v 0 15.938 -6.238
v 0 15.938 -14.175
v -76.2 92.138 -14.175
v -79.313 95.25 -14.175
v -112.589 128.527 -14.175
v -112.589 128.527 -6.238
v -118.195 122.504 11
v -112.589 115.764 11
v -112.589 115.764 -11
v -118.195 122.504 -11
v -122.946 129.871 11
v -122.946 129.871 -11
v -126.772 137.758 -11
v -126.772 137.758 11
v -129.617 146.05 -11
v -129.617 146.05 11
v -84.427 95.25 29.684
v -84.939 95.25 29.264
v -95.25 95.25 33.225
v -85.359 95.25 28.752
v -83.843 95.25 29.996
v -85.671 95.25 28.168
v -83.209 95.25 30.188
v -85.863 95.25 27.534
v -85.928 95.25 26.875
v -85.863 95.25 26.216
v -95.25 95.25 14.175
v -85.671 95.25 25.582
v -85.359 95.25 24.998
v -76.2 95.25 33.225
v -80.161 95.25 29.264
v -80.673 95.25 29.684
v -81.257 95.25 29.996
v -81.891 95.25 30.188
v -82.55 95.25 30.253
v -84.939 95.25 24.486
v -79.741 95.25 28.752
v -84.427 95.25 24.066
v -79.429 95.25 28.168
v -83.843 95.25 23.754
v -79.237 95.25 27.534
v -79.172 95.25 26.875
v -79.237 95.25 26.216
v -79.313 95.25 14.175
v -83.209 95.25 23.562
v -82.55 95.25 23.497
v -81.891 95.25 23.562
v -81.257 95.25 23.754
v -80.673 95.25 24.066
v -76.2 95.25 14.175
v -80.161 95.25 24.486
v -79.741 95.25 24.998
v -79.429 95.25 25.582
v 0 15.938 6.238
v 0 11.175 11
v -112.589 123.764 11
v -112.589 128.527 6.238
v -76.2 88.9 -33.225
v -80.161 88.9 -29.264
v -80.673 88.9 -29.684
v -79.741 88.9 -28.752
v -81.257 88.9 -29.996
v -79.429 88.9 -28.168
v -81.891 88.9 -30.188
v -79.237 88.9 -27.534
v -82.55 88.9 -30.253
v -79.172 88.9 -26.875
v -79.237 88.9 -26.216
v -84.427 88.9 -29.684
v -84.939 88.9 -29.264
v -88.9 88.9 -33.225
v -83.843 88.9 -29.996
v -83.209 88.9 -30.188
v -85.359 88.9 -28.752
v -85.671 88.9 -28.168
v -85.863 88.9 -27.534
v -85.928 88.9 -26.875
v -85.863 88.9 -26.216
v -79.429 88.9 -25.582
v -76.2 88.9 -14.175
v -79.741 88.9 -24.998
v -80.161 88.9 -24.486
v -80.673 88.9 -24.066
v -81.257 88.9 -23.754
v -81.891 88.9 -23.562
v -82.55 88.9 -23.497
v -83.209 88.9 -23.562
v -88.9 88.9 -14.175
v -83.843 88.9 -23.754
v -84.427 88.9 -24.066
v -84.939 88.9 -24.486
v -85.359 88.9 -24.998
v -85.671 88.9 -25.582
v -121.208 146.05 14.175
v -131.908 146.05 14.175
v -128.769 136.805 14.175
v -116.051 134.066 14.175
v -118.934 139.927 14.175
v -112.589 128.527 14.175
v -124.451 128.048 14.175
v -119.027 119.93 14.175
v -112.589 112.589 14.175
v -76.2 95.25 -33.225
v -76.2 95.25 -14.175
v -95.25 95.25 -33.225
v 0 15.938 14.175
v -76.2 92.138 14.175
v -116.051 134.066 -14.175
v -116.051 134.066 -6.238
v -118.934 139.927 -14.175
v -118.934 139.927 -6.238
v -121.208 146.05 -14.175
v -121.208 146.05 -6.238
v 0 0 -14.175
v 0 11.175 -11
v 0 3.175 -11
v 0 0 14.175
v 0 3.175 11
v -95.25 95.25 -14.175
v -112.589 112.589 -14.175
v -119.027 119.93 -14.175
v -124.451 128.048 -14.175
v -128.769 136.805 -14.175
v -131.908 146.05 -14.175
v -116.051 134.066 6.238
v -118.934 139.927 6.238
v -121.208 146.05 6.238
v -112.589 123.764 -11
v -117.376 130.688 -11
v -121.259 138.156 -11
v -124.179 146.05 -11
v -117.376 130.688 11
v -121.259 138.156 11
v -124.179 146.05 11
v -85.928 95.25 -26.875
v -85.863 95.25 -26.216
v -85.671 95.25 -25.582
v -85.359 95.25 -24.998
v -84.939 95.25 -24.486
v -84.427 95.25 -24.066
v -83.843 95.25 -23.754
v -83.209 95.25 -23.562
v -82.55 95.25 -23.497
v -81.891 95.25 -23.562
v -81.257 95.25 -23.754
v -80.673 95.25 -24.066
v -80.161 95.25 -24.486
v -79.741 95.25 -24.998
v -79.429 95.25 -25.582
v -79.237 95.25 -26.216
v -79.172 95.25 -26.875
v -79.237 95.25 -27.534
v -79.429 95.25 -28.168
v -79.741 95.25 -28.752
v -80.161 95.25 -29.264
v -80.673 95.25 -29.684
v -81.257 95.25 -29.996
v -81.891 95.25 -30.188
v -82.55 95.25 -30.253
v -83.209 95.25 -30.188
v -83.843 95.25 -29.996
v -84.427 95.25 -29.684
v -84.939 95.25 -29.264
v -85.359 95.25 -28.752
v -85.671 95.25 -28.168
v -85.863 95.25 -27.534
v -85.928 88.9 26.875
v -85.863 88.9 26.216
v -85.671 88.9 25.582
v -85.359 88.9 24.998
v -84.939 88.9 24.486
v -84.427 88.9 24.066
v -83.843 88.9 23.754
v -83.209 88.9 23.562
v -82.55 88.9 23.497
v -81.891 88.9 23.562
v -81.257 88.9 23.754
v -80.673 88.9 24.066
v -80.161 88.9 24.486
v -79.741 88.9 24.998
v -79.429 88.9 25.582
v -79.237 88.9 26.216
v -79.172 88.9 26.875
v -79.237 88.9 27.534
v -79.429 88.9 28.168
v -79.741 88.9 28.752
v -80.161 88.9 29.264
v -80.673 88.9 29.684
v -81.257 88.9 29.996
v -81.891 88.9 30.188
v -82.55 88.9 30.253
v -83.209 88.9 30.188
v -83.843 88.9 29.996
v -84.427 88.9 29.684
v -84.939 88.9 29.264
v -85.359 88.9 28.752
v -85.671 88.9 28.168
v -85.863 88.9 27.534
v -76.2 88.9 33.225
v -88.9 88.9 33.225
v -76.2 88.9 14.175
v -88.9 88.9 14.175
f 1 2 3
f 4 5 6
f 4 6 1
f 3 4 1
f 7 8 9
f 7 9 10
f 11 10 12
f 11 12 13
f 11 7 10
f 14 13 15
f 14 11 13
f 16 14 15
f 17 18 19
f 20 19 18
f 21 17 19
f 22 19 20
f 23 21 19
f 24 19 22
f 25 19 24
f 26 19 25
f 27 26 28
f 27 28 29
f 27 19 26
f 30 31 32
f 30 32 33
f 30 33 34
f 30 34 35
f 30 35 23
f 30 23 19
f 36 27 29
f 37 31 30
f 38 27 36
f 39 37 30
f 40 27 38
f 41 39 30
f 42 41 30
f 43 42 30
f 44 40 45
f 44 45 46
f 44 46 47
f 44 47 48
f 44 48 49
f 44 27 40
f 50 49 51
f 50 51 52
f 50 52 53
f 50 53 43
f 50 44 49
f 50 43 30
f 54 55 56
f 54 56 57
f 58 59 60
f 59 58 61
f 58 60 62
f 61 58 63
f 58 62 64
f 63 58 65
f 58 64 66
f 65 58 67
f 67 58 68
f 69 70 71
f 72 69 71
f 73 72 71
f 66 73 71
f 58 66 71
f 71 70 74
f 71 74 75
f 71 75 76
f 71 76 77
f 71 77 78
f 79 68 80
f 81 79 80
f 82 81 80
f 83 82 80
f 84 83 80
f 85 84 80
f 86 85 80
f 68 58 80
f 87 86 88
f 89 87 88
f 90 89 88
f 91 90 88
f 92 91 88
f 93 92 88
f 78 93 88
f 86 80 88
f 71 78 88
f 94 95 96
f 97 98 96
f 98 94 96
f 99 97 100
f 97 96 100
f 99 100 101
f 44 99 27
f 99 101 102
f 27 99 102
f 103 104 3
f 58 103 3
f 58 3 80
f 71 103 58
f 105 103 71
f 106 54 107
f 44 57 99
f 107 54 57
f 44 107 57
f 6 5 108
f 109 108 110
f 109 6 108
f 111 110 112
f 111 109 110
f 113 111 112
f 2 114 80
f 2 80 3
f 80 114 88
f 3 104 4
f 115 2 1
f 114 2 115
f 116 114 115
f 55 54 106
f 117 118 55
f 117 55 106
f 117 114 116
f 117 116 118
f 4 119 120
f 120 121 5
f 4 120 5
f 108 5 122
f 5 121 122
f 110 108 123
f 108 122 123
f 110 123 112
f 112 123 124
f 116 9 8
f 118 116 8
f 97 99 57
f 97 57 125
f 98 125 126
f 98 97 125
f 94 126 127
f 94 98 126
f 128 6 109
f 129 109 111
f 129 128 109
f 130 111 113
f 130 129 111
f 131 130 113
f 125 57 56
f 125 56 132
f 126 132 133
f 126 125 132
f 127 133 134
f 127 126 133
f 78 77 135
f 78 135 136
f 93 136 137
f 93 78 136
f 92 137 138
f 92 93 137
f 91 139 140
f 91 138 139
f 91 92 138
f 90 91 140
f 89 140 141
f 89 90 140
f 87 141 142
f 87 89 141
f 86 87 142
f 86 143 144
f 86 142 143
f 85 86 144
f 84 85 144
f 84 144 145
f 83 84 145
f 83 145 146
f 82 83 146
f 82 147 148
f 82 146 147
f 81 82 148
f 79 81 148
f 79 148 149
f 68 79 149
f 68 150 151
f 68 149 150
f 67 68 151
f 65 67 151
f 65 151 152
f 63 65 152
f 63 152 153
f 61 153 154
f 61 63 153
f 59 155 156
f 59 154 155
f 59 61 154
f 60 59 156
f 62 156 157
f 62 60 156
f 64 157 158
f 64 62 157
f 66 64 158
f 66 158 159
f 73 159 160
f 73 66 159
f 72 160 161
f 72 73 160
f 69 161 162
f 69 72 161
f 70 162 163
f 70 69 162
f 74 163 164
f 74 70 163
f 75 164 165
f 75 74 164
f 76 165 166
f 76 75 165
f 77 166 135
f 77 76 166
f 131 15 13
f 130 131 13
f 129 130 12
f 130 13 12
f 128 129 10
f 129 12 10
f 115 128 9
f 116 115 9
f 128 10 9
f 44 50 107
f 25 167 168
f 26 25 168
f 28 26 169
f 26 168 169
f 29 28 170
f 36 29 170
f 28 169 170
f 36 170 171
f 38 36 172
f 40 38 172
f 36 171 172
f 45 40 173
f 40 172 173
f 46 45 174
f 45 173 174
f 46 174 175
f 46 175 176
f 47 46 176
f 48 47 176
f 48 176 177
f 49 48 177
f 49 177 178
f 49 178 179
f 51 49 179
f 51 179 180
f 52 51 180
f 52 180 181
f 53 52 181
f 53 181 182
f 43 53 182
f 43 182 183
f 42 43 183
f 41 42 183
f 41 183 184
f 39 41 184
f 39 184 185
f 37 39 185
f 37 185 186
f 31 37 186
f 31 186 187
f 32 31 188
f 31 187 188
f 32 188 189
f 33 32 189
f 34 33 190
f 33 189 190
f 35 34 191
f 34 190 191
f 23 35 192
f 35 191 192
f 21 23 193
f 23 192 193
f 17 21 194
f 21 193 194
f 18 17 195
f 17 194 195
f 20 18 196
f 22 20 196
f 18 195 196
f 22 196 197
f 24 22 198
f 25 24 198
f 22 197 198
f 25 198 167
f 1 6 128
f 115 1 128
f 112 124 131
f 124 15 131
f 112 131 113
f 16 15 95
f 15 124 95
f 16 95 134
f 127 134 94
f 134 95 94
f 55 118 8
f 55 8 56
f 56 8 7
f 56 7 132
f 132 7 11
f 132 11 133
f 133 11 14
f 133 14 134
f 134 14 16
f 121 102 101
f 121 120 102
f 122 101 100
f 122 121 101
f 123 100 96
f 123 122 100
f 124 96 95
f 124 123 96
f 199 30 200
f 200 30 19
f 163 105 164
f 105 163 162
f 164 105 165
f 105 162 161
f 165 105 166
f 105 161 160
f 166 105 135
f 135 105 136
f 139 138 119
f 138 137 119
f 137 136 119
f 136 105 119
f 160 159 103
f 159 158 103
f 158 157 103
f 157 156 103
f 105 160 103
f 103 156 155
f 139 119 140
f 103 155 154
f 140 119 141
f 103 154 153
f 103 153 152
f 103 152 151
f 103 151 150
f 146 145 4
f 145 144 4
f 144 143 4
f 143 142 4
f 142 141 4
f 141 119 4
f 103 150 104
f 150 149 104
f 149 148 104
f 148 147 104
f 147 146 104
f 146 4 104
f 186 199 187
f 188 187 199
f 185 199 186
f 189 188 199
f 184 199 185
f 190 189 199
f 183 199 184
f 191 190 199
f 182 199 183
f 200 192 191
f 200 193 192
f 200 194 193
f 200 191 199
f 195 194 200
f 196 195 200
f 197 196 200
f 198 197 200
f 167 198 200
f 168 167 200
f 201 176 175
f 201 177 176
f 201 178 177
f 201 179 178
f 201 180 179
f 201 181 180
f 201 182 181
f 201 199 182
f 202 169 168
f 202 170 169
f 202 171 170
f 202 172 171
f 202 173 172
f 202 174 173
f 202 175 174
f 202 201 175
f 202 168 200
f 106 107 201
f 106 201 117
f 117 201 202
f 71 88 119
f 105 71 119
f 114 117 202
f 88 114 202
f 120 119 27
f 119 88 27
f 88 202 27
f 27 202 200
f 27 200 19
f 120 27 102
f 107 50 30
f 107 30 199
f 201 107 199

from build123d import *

# Parameters (mm, degrees)
CUT_EXTRUDE1_DEPTH      = 210.179727901
BOSS_EXTRUDE3_DEPTH     = 19.05
F_1_4_CLEARANCE_HOLE1_D = 6.7564


with BuildPart() as part:
    # Sweep1: sweep along a path in Sketch1
    with BuildLine(Plane.XY) as sweep1_path:
        Line((0, 0), (-112.58934785, 112.58934785))
        ThreePointArc((-112.58934785, 112.58934785), (-124.451195327, 128.04800845), (-131.907864376, 146.05))
    # Sketch2 → Sweep1 (sweep)
    with BuildSketch(Plane(origin=(0, 0, 0), x_dir=(0, 0, -1), z_dir=(1, 0, 0))):
        Polygon((0, 0), (14.175, 0), (14.175, 15.9375), (6.2375, 15.9375), (11, 11.175), (11, 3.175), (-11, 3.175), (-11, 11.175), (-6.2375, 15.9375), (-14.175, 15.9375), (-14.175, 0), align=None)
    sweep(path=sweep1_path.line)

    # Sketch3 → Cut-Extrude1 (cut, through all)
    with BuildSketch(Plane(origin=(0, 0, 14.175), x_dir=(-1, 0, 0), z_dir=(0, 0, -1))):
        Polygon((131.907864376, 146.05), (121.208421138, 146.05), (123.939114376, 159.852279873), align=None)
    extrude(amount=CUT_EXTRUDE1_DEPTH, mode=Mode.SUBTRACT)

    # Sketch10 → Boss-Extrude3 (add)
    with BuildSketch(Plane.XY.offset(14.175)):
        Polygon((-88.9, 88.9), (-95.25, 95.25), (-76.2, 95.25), (-76.2, 88.9), align=None)
    boss_extrude3 = extrude(amount=BOSS_EXTRUDE3_DEPTH)

    # 1/4 Clearance Hole1 (through all)
    with Locations(Plane(origin=(0, 95.25, 0), x_dir=(1, 0, 0), z_dir=(0, 1, 0))):
        with Locations((-82.55, -26.875)):
            f_1_4_clearance_hole1 = Hole(F_1_4_CLEARANCE_HOLE1_D / 2)

    # Mirror1: Boss-Extrude3, 1/4 Clearance Hole1 across plane
    add(boss_extrude3.mirror(Plane.XY))
    add(f_1_4_clearance_hole1.mirror(Plane.XY), mode=Mode.SUBTRACT)


solid = part.part
